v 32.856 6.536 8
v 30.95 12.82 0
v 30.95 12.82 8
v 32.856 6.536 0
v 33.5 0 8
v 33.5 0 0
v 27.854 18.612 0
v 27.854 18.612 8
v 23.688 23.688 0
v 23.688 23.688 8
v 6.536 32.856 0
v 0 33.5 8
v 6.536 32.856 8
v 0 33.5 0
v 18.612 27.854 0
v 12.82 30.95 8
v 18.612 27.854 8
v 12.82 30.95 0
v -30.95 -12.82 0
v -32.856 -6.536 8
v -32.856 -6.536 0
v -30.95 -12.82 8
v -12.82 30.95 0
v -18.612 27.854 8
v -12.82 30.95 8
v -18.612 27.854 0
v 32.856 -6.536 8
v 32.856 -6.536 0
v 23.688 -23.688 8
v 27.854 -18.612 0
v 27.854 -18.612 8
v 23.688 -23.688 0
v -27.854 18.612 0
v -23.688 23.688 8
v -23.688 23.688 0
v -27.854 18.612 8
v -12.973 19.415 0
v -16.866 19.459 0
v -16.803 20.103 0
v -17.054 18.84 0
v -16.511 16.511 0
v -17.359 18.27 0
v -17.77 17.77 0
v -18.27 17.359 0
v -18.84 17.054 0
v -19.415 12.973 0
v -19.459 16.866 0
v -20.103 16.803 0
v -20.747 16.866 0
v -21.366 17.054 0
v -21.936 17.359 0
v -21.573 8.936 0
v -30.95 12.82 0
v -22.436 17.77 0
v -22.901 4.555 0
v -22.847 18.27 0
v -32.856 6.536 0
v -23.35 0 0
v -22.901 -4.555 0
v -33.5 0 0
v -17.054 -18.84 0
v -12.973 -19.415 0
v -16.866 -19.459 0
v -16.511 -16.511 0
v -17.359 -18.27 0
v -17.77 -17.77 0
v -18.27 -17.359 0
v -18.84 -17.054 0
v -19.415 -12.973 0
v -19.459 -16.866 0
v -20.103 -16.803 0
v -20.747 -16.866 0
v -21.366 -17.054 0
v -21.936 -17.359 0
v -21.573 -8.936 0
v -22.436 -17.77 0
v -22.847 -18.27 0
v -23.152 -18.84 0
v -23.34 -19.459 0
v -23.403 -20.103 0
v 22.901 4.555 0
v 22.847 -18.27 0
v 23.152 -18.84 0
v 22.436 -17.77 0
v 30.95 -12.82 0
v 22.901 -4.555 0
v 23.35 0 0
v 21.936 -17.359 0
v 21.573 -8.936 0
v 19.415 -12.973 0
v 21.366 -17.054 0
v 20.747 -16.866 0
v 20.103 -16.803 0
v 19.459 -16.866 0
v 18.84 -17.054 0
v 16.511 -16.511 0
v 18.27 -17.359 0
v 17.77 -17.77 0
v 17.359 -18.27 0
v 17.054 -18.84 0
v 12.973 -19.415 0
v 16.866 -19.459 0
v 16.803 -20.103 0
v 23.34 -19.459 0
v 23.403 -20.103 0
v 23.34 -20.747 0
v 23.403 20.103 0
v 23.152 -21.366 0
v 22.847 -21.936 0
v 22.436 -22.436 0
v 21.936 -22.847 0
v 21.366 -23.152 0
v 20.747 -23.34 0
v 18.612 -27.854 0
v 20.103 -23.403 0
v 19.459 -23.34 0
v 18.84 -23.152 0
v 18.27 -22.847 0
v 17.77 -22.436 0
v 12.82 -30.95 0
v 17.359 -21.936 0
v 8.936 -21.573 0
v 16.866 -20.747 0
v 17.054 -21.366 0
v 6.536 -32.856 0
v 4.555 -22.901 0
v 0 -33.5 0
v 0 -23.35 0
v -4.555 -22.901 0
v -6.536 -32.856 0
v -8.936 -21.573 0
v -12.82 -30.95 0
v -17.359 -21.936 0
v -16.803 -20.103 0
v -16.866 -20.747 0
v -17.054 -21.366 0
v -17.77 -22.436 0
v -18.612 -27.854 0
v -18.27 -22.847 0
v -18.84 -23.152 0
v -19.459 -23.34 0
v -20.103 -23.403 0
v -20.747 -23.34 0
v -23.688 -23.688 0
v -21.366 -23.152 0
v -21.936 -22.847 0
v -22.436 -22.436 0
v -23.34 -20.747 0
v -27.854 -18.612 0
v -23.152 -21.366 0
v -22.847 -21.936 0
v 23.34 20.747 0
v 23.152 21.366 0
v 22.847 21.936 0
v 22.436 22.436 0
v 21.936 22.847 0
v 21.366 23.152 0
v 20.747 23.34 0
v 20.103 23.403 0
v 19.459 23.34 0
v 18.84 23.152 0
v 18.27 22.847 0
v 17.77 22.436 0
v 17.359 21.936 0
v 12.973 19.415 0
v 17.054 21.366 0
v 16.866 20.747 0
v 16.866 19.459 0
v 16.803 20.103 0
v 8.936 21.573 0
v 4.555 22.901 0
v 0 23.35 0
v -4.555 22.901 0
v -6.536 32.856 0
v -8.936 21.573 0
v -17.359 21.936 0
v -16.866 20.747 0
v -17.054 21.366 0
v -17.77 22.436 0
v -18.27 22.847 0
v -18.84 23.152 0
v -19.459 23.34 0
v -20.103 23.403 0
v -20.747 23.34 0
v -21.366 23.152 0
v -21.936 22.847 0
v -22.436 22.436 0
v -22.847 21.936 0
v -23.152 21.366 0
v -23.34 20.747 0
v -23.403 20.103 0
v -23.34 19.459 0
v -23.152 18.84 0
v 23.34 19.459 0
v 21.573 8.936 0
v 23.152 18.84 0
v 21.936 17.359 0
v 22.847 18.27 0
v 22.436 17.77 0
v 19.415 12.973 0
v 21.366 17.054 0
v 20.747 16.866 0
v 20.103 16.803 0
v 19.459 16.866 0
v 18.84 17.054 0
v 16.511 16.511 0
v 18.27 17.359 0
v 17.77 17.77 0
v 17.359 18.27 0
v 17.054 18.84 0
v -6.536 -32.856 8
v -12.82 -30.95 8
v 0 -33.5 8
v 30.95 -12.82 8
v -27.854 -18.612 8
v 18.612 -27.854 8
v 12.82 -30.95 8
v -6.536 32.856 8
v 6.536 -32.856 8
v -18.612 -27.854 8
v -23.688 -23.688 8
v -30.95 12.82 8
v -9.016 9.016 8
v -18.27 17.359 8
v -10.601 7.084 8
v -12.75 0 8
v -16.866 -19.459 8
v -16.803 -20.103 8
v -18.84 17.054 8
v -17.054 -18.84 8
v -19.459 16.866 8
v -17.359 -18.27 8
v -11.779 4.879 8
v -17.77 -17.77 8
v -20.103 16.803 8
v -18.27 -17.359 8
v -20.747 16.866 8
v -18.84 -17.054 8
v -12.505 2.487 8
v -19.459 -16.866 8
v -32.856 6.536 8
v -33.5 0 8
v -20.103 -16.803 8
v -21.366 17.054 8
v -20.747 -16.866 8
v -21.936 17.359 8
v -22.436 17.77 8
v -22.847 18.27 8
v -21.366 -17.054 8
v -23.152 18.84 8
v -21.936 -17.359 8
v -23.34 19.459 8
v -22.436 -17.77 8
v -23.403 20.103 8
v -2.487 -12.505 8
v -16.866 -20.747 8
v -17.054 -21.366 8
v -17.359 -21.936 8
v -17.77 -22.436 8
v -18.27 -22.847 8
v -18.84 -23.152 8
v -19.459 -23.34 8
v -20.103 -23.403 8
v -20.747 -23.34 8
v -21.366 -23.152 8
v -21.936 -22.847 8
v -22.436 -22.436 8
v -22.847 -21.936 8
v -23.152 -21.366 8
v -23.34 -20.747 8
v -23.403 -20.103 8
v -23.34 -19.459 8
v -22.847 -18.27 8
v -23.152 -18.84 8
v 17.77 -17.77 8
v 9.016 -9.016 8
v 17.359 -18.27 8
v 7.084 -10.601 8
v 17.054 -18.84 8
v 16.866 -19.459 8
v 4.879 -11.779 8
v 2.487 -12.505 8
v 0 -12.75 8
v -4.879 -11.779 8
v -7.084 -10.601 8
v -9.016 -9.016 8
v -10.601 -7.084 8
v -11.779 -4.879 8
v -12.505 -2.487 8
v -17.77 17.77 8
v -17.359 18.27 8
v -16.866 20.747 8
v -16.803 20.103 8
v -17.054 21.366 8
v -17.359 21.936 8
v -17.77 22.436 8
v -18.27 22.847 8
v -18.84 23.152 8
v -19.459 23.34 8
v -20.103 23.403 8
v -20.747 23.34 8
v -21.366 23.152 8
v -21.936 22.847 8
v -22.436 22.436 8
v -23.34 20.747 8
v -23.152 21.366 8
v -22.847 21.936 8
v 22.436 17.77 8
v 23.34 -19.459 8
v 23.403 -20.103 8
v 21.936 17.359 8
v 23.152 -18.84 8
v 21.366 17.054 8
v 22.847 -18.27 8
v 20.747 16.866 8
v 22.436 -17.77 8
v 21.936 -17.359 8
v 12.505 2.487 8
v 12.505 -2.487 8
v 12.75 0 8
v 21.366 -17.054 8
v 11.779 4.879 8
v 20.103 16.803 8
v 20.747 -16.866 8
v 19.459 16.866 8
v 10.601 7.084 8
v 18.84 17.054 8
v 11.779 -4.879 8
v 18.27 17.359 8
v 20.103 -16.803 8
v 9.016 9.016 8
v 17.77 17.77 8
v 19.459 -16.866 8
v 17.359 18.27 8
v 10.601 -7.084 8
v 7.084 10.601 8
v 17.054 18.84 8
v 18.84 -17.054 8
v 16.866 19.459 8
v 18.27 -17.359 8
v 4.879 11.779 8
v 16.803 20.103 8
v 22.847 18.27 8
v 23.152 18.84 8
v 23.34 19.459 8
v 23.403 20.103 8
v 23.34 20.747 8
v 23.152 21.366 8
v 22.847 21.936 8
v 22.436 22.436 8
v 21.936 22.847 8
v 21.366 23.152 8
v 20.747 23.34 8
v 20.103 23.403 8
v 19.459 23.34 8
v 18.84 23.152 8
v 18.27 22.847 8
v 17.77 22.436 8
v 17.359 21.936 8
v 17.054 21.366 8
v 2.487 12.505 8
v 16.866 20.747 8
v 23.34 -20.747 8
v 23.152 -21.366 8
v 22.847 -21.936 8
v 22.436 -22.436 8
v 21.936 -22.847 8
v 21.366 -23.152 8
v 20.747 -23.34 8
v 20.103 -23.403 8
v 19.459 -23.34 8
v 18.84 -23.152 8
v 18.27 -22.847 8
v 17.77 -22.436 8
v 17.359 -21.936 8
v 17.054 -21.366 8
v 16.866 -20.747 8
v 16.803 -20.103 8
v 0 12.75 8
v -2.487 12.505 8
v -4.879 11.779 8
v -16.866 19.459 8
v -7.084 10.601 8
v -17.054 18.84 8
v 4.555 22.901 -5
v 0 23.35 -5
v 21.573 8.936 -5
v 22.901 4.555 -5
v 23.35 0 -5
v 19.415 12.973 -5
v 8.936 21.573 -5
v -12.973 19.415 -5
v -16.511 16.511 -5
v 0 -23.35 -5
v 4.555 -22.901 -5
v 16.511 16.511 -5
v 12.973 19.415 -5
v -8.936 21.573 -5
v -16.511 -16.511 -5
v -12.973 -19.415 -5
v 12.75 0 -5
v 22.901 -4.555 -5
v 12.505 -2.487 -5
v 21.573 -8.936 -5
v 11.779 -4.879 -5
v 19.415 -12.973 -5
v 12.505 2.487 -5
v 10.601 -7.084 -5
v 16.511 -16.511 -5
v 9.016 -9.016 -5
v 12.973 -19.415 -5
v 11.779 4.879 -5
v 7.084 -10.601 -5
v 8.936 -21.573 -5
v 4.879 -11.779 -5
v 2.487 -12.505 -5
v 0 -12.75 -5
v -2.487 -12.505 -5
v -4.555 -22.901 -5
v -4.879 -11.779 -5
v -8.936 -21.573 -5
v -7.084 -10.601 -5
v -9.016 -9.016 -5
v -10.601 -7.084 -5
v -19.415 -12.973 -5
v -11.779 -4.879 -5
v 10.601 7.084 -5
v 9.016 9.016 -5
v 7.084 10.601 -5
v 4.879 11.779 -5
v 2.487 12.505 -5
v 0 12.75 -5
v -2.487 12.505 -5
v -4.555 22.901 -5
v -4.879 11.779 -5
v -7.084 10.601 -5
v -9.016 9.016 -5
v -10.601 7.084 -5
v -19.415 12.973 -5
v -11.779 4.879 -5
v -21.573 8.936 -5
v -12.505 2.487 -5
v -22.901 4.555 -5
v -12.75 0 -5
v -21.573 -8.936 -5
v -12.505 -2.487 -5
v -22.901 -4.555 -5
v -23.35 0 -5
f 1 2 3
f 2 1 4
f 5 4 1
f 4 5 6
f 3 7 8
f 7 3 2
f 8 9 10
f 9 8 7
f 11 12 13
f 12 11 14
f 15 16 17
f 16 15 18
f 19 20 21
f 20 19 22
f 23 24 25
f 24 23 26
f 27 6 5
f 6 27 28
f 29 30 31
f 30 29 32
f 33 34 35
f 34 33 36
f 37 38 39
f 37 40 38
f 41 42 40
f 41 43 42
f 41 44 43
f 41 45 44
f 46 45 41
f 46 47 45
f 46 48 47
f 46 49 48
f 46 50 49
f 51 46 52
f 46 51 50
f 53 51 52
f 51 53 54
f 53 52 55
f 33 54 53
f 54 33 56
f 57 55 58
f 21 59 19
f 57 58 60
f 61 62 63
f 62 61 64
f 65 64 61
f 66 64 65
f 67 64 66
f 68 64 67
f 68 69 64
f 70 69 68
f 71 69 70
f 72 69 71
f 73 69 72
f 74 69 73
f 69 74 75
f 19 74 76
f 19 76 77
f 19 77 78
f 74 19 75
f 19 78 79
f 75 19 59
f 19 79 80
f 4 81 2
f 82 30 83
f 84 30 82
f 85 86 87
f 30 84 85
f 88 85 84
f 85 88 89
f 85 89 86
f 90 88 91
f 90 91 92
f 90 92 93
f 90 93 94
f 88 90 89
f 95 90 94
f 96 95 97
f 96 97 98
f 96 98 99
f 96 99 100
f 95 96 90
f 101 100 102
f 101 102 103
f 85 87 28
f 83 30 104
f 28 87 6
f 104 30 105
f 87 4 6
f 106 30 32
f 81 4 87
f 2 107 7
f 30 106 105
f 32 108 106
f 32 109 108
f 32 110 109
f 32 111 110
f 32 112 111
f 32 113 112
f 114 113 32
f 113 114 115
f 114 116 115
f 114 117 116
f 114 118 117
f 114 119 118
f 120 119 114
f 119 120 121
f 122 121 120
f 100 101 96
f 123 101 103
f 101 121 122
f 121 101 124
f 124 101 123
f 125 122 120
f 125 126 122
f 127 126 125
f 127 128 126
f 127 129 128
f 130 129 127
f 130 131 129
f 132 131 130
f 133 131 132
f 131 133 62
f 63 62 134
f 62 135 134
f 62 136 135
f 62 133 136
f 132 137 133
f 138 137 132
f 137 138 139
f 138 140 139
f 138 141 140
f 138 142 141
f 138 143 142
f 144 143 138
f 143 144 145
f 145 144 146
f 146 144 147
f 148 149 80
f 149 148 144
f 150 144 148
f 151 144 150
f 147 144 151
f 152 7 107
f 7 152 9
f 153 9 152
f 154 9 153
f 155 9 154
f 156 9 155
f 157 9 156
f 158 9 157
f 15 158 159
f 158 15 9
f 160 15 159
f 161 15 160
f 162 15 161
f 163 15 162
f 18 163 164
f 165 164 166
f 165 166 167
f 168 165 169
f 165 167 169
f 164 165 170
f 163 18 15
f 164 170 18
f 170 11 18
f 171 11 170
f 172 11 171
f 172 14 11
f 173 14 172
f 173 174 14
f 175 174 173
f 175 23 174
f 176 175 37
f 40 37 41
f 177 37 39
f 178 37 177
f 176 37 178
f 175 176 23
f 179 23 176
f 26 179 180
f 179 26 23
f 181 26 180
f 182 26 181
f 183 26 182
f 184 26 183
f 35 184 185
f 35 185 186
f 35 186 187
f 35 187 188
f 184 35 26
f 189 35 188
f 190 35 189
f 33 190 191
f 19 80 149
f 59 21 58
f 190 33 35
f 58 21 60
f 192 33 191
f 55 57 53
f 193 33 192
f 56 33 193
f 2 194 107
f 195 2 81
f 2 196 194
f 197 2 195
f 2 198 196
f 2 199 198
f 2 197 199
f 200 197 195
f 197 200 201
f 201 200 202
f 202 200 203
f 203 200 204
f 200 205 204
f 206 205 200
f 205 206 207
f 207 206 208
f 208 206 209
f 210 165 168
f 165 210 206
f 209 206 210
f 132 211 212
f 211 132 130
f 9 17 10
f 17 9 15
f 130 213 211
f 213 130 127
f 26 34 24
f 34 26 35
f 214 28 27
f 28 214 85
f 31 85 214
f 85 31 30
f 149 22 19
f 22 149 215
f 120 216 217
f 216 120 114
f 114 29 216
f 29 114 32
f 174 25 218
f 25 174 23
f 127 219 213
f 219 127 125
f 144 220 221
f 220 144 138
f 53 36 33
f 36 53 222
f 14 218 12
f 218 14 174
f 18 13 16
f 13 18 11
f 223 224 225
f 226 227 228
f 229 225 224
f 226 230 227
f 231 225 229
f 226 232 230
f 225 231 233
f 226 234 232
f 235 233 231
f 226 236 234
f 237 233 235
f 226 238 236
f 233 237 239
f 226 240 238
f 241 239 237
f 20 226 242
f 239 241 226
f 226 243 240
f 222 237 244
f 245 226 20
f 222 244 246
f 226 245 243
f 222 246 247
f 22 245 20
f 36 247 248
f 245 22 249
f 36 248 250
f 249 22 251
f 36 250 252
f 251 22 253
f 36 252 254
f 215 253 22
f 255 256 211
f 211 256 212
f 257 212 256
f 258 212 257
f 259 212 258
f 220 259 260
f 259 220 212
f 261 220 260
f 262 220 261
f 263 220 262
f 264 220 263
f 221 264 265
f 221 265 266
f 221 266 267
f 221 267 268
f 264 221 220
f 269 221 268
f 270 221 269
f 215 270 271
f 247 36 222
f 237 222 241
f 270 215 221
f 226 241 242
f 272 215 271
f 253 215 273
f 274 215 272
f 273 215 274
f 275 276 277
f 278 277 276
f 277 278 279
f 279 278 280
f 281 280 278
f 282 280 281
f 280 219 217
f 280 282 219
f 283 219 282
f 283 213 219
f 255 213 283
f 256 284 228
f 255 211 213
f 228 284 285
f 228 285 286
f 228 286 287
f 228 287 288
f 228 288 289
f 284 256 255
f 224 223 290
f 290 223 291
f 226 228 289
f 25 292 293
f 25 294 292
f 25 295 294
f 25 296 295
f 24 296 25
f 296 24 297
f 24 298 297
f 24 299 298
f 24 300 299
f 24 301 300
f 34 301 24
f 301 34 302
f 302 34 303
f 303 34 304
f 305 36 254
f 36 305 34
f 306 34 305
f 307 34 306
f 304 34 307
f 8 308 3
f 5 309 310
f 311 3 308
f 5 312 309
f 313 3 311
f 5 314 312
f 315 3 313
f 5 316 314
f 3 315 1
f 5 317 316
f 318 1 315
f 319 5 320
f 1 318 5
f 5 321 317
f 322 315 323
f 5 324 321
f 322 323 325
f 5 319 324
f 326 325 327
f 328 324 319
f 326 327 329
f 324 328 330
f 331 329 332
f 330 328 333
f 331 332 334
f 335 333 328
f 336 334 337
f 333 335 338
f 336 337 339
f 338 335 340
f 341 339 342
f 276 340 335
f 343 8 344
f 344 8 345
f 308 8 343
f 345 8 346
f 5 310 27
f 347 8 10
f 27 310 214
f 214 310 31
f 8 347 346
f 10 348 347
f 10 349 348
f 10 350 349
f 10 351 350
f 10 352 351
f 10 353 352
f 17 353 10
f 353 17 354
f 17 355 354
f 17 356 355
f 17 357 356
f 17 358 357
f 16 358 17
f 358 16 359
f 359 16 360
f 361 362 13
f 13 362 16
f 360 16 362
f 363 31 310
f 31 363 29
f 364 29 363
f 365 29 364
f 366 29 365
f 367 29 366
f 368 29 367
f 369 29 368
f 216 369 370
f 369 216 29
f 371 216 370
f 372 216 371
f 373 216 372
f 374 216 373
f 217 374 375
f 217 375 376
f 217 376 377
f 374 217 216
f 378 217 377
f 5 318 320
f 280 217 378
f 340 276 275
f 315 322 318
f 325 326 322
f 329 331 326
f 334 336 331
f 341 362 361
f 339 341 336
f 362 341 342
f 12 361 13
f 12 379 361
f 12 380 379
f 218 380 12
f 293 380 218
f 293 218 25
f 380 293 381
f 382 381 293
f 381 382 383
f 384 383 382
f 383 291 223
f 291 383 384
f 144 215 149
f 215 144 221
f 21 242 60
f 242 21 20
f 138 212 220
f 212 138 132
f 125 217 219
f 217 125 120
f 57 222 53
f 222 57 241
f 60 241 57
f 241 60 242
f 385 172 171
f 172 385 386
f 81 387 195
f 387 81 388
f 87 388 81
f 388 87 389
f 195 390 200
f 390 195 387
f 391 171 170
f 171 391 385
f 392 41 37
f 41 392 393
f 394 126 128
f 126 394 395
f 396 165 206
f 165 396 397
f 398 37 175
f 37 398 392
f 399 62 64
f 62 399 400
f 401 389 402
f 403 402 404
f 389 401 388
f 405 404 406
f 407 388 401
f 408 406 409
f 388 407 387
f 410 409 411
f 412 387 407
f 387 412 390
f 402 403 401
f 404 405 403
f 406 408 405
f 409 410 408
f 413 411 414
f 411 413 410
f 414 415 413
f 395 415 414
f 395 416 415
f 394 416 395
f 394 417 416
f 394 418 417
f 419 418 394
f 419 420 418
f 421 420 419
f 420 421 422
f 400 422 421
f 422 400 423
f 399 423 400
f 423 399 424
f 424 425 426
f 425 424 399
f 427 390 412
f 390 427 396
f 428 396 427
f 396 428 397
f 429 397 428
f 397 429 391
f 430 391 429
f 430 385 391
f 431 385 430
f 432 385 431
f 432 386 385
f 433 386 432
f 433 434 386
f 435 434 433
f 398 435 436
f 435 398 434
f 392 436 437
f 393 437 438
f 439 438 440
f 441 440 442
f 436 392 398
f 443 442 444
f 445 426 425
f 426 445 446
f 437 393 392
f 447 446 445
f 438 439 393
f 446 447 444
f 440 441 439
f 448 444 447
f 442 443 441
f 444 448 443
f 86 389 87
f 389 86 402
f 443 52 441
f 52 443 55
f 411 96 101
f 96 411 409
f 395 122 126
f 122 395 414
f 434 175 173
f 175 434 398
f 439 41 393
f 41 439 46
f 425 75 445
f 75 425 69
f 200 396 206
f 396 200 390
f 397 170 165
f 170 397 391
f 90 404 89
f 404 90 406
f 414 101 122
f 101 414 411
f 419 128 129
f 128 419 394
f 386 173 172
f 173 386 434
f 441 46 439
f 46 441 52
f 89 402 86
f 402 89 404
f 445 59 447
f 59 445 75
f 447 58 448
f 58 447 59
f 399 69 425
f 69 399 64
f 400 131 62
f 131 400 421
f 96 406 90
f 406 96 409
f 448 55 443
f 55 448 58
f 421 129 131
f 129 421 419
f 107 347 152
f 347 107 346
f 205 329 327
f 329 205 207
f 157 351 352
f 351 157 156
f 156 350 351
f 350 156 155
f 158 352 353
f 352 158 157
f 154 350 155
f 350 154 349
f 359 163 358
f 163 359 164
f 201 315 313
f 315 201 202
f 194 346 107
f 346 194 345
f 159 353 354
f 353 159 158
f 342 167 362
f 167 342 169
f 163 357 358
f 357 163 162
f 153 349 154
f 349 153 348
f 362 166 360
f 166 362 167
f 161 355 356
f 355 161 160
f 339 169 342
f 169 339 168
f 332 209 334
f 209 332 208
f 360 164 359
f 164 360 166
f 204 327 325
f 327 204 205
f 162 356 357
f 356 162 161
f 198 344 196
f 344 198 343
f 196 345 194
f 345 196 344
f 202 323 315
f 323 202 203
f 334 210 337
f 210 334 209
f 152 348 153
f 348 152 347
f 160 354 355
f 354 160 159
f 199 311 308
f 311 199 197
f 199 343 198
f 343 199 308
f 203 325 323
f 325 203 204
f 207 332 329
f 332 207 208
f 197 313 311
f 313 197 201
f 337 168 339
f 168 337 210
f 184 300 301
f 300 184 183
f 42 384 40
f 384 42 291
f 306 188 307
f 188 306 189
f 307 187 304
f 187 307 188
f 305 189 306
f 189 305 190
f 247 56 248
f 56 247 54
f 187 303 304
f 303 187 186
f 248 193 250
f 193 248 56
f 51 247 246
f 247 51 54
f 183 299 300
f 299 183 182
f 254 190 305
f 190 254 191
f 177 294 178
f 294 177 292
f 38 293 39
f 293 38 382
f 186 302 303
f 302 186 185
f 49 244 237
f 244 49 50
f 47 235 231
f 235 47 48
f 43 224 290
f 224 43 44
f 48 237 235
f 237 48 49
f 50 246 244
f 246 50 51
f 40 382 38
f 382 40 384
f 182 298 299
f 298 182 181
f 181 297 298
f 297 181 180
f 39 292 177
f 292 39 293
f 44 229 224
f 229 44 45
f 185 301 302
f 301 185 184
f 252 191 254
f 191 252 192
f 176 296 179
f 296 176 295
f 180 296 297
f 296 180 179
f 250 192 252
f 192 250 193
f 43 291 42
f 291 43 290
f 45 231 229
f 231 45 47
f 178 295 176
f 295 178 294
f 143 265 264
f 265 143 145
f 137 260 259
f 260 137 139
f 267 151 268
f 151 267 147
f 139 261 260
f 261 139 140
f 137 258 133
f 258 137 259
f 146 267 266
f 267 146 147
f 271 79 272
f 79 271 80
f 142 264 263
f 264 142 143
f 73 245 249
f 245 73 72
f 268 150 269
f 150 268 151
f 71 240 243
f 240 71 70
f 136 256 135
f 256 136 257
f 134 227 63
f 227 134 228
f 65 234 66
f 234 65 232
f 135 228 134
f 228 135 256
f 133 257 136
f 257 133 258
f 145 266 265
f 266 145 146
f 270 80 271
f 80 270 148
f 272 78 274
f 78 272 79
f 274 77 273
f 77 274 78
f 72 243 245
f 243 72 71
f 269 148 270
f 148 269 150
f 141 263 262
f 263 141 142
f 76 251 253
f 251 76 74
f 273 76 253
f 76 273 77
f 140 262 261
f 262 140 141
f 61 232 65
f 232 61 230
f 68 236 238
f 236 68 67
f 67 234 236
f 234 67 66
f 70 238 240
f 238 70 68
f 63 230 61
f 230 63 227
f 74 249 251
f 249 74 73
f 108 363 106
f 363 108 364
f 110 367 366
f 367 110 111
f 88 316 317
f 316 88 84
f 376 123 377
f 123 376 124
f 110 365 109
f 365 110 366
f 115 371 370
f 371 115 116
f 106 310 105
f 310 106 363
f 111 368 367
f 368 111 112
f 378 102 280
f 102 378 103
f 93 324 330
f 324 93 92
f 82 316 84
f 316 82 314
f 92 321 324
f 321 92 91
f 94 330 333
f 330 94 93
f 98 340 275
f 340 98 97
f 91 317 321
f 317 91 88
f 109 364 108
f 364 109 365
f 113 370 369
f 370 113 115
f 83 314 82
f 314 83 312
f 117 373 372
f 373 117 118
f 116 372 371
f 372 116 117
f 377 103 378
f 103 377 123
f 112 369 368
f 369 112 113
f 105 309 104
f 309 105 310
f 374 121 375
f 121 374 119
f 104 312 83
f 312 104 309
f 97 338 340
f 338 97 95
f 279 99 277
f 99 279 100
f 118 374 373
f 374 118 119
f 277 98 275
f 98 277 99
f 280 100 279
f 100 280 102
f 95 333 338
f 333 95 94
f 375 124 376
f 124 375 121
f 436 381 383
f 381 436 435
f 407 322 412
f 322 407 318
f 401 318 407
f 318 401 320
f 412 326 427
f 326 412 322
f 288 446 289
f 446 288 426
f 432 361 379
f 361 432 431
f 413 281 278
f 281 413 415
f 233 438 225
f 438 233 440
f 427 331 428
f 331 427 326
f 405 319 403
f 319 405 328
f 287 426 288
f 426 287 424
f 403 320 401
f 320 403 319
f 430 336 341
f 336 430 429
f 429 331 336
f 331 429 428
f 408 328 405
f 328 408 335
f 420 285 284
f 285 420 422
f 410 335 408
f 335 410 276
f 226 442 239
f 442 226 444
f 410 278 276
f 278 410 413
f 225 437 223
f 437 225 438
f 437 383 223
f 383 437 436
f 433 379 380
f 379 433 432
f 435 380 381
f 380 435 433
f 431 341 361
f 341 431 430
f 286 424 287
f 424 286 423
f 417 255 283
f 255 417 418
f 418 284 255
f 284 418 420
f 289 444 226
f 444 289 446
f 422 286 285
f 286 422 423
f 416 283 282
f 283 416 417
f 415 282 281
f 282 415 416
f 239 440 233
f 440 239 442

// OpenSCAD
$fn = 32;

// ----------------------------------------------------------------------
// Retaining cap: 6005 cover, 67 mm, spigot 46.7 mm
// ----------------------------------------------------------------------

// --- parameters (mm) ---
plate_d = 67;             // cover diameter
plate_t = 8;              // cover thickness
boss_d = 46.7;            // spigot that enters the housing
boss_h = 5;               // spigot height
shaft_d = 25.5;           // shaft opening
bolt_d = 6.6;             // bolt clearance
bolt_r = 28.43;           // bolt circle radius

module cover() {
  cylinder(h = plate_t, d = plate_d);
}

module spigot() {
  /* sunk 1 mm into the cover; the spigot sets the overall height */
  translate([0, 0, -boss_h]) cylinder(h = boss_h + 1, d = boss_d);
}

difference() {
  union() {
    cover();
    spigot();
  }
  for (i = [0 : 3]) rotate([0, 0, 45 + i * 90]) translate([bolt_r, 0, -boss_h - 1])
    cylinder(h = boss_h + plate_t + 2, d = bolt_d);
  translate([0, 0, -boss_h - 1]) cylinder(h = boss_h + plate_t + 2, d = shaft_d);
}
